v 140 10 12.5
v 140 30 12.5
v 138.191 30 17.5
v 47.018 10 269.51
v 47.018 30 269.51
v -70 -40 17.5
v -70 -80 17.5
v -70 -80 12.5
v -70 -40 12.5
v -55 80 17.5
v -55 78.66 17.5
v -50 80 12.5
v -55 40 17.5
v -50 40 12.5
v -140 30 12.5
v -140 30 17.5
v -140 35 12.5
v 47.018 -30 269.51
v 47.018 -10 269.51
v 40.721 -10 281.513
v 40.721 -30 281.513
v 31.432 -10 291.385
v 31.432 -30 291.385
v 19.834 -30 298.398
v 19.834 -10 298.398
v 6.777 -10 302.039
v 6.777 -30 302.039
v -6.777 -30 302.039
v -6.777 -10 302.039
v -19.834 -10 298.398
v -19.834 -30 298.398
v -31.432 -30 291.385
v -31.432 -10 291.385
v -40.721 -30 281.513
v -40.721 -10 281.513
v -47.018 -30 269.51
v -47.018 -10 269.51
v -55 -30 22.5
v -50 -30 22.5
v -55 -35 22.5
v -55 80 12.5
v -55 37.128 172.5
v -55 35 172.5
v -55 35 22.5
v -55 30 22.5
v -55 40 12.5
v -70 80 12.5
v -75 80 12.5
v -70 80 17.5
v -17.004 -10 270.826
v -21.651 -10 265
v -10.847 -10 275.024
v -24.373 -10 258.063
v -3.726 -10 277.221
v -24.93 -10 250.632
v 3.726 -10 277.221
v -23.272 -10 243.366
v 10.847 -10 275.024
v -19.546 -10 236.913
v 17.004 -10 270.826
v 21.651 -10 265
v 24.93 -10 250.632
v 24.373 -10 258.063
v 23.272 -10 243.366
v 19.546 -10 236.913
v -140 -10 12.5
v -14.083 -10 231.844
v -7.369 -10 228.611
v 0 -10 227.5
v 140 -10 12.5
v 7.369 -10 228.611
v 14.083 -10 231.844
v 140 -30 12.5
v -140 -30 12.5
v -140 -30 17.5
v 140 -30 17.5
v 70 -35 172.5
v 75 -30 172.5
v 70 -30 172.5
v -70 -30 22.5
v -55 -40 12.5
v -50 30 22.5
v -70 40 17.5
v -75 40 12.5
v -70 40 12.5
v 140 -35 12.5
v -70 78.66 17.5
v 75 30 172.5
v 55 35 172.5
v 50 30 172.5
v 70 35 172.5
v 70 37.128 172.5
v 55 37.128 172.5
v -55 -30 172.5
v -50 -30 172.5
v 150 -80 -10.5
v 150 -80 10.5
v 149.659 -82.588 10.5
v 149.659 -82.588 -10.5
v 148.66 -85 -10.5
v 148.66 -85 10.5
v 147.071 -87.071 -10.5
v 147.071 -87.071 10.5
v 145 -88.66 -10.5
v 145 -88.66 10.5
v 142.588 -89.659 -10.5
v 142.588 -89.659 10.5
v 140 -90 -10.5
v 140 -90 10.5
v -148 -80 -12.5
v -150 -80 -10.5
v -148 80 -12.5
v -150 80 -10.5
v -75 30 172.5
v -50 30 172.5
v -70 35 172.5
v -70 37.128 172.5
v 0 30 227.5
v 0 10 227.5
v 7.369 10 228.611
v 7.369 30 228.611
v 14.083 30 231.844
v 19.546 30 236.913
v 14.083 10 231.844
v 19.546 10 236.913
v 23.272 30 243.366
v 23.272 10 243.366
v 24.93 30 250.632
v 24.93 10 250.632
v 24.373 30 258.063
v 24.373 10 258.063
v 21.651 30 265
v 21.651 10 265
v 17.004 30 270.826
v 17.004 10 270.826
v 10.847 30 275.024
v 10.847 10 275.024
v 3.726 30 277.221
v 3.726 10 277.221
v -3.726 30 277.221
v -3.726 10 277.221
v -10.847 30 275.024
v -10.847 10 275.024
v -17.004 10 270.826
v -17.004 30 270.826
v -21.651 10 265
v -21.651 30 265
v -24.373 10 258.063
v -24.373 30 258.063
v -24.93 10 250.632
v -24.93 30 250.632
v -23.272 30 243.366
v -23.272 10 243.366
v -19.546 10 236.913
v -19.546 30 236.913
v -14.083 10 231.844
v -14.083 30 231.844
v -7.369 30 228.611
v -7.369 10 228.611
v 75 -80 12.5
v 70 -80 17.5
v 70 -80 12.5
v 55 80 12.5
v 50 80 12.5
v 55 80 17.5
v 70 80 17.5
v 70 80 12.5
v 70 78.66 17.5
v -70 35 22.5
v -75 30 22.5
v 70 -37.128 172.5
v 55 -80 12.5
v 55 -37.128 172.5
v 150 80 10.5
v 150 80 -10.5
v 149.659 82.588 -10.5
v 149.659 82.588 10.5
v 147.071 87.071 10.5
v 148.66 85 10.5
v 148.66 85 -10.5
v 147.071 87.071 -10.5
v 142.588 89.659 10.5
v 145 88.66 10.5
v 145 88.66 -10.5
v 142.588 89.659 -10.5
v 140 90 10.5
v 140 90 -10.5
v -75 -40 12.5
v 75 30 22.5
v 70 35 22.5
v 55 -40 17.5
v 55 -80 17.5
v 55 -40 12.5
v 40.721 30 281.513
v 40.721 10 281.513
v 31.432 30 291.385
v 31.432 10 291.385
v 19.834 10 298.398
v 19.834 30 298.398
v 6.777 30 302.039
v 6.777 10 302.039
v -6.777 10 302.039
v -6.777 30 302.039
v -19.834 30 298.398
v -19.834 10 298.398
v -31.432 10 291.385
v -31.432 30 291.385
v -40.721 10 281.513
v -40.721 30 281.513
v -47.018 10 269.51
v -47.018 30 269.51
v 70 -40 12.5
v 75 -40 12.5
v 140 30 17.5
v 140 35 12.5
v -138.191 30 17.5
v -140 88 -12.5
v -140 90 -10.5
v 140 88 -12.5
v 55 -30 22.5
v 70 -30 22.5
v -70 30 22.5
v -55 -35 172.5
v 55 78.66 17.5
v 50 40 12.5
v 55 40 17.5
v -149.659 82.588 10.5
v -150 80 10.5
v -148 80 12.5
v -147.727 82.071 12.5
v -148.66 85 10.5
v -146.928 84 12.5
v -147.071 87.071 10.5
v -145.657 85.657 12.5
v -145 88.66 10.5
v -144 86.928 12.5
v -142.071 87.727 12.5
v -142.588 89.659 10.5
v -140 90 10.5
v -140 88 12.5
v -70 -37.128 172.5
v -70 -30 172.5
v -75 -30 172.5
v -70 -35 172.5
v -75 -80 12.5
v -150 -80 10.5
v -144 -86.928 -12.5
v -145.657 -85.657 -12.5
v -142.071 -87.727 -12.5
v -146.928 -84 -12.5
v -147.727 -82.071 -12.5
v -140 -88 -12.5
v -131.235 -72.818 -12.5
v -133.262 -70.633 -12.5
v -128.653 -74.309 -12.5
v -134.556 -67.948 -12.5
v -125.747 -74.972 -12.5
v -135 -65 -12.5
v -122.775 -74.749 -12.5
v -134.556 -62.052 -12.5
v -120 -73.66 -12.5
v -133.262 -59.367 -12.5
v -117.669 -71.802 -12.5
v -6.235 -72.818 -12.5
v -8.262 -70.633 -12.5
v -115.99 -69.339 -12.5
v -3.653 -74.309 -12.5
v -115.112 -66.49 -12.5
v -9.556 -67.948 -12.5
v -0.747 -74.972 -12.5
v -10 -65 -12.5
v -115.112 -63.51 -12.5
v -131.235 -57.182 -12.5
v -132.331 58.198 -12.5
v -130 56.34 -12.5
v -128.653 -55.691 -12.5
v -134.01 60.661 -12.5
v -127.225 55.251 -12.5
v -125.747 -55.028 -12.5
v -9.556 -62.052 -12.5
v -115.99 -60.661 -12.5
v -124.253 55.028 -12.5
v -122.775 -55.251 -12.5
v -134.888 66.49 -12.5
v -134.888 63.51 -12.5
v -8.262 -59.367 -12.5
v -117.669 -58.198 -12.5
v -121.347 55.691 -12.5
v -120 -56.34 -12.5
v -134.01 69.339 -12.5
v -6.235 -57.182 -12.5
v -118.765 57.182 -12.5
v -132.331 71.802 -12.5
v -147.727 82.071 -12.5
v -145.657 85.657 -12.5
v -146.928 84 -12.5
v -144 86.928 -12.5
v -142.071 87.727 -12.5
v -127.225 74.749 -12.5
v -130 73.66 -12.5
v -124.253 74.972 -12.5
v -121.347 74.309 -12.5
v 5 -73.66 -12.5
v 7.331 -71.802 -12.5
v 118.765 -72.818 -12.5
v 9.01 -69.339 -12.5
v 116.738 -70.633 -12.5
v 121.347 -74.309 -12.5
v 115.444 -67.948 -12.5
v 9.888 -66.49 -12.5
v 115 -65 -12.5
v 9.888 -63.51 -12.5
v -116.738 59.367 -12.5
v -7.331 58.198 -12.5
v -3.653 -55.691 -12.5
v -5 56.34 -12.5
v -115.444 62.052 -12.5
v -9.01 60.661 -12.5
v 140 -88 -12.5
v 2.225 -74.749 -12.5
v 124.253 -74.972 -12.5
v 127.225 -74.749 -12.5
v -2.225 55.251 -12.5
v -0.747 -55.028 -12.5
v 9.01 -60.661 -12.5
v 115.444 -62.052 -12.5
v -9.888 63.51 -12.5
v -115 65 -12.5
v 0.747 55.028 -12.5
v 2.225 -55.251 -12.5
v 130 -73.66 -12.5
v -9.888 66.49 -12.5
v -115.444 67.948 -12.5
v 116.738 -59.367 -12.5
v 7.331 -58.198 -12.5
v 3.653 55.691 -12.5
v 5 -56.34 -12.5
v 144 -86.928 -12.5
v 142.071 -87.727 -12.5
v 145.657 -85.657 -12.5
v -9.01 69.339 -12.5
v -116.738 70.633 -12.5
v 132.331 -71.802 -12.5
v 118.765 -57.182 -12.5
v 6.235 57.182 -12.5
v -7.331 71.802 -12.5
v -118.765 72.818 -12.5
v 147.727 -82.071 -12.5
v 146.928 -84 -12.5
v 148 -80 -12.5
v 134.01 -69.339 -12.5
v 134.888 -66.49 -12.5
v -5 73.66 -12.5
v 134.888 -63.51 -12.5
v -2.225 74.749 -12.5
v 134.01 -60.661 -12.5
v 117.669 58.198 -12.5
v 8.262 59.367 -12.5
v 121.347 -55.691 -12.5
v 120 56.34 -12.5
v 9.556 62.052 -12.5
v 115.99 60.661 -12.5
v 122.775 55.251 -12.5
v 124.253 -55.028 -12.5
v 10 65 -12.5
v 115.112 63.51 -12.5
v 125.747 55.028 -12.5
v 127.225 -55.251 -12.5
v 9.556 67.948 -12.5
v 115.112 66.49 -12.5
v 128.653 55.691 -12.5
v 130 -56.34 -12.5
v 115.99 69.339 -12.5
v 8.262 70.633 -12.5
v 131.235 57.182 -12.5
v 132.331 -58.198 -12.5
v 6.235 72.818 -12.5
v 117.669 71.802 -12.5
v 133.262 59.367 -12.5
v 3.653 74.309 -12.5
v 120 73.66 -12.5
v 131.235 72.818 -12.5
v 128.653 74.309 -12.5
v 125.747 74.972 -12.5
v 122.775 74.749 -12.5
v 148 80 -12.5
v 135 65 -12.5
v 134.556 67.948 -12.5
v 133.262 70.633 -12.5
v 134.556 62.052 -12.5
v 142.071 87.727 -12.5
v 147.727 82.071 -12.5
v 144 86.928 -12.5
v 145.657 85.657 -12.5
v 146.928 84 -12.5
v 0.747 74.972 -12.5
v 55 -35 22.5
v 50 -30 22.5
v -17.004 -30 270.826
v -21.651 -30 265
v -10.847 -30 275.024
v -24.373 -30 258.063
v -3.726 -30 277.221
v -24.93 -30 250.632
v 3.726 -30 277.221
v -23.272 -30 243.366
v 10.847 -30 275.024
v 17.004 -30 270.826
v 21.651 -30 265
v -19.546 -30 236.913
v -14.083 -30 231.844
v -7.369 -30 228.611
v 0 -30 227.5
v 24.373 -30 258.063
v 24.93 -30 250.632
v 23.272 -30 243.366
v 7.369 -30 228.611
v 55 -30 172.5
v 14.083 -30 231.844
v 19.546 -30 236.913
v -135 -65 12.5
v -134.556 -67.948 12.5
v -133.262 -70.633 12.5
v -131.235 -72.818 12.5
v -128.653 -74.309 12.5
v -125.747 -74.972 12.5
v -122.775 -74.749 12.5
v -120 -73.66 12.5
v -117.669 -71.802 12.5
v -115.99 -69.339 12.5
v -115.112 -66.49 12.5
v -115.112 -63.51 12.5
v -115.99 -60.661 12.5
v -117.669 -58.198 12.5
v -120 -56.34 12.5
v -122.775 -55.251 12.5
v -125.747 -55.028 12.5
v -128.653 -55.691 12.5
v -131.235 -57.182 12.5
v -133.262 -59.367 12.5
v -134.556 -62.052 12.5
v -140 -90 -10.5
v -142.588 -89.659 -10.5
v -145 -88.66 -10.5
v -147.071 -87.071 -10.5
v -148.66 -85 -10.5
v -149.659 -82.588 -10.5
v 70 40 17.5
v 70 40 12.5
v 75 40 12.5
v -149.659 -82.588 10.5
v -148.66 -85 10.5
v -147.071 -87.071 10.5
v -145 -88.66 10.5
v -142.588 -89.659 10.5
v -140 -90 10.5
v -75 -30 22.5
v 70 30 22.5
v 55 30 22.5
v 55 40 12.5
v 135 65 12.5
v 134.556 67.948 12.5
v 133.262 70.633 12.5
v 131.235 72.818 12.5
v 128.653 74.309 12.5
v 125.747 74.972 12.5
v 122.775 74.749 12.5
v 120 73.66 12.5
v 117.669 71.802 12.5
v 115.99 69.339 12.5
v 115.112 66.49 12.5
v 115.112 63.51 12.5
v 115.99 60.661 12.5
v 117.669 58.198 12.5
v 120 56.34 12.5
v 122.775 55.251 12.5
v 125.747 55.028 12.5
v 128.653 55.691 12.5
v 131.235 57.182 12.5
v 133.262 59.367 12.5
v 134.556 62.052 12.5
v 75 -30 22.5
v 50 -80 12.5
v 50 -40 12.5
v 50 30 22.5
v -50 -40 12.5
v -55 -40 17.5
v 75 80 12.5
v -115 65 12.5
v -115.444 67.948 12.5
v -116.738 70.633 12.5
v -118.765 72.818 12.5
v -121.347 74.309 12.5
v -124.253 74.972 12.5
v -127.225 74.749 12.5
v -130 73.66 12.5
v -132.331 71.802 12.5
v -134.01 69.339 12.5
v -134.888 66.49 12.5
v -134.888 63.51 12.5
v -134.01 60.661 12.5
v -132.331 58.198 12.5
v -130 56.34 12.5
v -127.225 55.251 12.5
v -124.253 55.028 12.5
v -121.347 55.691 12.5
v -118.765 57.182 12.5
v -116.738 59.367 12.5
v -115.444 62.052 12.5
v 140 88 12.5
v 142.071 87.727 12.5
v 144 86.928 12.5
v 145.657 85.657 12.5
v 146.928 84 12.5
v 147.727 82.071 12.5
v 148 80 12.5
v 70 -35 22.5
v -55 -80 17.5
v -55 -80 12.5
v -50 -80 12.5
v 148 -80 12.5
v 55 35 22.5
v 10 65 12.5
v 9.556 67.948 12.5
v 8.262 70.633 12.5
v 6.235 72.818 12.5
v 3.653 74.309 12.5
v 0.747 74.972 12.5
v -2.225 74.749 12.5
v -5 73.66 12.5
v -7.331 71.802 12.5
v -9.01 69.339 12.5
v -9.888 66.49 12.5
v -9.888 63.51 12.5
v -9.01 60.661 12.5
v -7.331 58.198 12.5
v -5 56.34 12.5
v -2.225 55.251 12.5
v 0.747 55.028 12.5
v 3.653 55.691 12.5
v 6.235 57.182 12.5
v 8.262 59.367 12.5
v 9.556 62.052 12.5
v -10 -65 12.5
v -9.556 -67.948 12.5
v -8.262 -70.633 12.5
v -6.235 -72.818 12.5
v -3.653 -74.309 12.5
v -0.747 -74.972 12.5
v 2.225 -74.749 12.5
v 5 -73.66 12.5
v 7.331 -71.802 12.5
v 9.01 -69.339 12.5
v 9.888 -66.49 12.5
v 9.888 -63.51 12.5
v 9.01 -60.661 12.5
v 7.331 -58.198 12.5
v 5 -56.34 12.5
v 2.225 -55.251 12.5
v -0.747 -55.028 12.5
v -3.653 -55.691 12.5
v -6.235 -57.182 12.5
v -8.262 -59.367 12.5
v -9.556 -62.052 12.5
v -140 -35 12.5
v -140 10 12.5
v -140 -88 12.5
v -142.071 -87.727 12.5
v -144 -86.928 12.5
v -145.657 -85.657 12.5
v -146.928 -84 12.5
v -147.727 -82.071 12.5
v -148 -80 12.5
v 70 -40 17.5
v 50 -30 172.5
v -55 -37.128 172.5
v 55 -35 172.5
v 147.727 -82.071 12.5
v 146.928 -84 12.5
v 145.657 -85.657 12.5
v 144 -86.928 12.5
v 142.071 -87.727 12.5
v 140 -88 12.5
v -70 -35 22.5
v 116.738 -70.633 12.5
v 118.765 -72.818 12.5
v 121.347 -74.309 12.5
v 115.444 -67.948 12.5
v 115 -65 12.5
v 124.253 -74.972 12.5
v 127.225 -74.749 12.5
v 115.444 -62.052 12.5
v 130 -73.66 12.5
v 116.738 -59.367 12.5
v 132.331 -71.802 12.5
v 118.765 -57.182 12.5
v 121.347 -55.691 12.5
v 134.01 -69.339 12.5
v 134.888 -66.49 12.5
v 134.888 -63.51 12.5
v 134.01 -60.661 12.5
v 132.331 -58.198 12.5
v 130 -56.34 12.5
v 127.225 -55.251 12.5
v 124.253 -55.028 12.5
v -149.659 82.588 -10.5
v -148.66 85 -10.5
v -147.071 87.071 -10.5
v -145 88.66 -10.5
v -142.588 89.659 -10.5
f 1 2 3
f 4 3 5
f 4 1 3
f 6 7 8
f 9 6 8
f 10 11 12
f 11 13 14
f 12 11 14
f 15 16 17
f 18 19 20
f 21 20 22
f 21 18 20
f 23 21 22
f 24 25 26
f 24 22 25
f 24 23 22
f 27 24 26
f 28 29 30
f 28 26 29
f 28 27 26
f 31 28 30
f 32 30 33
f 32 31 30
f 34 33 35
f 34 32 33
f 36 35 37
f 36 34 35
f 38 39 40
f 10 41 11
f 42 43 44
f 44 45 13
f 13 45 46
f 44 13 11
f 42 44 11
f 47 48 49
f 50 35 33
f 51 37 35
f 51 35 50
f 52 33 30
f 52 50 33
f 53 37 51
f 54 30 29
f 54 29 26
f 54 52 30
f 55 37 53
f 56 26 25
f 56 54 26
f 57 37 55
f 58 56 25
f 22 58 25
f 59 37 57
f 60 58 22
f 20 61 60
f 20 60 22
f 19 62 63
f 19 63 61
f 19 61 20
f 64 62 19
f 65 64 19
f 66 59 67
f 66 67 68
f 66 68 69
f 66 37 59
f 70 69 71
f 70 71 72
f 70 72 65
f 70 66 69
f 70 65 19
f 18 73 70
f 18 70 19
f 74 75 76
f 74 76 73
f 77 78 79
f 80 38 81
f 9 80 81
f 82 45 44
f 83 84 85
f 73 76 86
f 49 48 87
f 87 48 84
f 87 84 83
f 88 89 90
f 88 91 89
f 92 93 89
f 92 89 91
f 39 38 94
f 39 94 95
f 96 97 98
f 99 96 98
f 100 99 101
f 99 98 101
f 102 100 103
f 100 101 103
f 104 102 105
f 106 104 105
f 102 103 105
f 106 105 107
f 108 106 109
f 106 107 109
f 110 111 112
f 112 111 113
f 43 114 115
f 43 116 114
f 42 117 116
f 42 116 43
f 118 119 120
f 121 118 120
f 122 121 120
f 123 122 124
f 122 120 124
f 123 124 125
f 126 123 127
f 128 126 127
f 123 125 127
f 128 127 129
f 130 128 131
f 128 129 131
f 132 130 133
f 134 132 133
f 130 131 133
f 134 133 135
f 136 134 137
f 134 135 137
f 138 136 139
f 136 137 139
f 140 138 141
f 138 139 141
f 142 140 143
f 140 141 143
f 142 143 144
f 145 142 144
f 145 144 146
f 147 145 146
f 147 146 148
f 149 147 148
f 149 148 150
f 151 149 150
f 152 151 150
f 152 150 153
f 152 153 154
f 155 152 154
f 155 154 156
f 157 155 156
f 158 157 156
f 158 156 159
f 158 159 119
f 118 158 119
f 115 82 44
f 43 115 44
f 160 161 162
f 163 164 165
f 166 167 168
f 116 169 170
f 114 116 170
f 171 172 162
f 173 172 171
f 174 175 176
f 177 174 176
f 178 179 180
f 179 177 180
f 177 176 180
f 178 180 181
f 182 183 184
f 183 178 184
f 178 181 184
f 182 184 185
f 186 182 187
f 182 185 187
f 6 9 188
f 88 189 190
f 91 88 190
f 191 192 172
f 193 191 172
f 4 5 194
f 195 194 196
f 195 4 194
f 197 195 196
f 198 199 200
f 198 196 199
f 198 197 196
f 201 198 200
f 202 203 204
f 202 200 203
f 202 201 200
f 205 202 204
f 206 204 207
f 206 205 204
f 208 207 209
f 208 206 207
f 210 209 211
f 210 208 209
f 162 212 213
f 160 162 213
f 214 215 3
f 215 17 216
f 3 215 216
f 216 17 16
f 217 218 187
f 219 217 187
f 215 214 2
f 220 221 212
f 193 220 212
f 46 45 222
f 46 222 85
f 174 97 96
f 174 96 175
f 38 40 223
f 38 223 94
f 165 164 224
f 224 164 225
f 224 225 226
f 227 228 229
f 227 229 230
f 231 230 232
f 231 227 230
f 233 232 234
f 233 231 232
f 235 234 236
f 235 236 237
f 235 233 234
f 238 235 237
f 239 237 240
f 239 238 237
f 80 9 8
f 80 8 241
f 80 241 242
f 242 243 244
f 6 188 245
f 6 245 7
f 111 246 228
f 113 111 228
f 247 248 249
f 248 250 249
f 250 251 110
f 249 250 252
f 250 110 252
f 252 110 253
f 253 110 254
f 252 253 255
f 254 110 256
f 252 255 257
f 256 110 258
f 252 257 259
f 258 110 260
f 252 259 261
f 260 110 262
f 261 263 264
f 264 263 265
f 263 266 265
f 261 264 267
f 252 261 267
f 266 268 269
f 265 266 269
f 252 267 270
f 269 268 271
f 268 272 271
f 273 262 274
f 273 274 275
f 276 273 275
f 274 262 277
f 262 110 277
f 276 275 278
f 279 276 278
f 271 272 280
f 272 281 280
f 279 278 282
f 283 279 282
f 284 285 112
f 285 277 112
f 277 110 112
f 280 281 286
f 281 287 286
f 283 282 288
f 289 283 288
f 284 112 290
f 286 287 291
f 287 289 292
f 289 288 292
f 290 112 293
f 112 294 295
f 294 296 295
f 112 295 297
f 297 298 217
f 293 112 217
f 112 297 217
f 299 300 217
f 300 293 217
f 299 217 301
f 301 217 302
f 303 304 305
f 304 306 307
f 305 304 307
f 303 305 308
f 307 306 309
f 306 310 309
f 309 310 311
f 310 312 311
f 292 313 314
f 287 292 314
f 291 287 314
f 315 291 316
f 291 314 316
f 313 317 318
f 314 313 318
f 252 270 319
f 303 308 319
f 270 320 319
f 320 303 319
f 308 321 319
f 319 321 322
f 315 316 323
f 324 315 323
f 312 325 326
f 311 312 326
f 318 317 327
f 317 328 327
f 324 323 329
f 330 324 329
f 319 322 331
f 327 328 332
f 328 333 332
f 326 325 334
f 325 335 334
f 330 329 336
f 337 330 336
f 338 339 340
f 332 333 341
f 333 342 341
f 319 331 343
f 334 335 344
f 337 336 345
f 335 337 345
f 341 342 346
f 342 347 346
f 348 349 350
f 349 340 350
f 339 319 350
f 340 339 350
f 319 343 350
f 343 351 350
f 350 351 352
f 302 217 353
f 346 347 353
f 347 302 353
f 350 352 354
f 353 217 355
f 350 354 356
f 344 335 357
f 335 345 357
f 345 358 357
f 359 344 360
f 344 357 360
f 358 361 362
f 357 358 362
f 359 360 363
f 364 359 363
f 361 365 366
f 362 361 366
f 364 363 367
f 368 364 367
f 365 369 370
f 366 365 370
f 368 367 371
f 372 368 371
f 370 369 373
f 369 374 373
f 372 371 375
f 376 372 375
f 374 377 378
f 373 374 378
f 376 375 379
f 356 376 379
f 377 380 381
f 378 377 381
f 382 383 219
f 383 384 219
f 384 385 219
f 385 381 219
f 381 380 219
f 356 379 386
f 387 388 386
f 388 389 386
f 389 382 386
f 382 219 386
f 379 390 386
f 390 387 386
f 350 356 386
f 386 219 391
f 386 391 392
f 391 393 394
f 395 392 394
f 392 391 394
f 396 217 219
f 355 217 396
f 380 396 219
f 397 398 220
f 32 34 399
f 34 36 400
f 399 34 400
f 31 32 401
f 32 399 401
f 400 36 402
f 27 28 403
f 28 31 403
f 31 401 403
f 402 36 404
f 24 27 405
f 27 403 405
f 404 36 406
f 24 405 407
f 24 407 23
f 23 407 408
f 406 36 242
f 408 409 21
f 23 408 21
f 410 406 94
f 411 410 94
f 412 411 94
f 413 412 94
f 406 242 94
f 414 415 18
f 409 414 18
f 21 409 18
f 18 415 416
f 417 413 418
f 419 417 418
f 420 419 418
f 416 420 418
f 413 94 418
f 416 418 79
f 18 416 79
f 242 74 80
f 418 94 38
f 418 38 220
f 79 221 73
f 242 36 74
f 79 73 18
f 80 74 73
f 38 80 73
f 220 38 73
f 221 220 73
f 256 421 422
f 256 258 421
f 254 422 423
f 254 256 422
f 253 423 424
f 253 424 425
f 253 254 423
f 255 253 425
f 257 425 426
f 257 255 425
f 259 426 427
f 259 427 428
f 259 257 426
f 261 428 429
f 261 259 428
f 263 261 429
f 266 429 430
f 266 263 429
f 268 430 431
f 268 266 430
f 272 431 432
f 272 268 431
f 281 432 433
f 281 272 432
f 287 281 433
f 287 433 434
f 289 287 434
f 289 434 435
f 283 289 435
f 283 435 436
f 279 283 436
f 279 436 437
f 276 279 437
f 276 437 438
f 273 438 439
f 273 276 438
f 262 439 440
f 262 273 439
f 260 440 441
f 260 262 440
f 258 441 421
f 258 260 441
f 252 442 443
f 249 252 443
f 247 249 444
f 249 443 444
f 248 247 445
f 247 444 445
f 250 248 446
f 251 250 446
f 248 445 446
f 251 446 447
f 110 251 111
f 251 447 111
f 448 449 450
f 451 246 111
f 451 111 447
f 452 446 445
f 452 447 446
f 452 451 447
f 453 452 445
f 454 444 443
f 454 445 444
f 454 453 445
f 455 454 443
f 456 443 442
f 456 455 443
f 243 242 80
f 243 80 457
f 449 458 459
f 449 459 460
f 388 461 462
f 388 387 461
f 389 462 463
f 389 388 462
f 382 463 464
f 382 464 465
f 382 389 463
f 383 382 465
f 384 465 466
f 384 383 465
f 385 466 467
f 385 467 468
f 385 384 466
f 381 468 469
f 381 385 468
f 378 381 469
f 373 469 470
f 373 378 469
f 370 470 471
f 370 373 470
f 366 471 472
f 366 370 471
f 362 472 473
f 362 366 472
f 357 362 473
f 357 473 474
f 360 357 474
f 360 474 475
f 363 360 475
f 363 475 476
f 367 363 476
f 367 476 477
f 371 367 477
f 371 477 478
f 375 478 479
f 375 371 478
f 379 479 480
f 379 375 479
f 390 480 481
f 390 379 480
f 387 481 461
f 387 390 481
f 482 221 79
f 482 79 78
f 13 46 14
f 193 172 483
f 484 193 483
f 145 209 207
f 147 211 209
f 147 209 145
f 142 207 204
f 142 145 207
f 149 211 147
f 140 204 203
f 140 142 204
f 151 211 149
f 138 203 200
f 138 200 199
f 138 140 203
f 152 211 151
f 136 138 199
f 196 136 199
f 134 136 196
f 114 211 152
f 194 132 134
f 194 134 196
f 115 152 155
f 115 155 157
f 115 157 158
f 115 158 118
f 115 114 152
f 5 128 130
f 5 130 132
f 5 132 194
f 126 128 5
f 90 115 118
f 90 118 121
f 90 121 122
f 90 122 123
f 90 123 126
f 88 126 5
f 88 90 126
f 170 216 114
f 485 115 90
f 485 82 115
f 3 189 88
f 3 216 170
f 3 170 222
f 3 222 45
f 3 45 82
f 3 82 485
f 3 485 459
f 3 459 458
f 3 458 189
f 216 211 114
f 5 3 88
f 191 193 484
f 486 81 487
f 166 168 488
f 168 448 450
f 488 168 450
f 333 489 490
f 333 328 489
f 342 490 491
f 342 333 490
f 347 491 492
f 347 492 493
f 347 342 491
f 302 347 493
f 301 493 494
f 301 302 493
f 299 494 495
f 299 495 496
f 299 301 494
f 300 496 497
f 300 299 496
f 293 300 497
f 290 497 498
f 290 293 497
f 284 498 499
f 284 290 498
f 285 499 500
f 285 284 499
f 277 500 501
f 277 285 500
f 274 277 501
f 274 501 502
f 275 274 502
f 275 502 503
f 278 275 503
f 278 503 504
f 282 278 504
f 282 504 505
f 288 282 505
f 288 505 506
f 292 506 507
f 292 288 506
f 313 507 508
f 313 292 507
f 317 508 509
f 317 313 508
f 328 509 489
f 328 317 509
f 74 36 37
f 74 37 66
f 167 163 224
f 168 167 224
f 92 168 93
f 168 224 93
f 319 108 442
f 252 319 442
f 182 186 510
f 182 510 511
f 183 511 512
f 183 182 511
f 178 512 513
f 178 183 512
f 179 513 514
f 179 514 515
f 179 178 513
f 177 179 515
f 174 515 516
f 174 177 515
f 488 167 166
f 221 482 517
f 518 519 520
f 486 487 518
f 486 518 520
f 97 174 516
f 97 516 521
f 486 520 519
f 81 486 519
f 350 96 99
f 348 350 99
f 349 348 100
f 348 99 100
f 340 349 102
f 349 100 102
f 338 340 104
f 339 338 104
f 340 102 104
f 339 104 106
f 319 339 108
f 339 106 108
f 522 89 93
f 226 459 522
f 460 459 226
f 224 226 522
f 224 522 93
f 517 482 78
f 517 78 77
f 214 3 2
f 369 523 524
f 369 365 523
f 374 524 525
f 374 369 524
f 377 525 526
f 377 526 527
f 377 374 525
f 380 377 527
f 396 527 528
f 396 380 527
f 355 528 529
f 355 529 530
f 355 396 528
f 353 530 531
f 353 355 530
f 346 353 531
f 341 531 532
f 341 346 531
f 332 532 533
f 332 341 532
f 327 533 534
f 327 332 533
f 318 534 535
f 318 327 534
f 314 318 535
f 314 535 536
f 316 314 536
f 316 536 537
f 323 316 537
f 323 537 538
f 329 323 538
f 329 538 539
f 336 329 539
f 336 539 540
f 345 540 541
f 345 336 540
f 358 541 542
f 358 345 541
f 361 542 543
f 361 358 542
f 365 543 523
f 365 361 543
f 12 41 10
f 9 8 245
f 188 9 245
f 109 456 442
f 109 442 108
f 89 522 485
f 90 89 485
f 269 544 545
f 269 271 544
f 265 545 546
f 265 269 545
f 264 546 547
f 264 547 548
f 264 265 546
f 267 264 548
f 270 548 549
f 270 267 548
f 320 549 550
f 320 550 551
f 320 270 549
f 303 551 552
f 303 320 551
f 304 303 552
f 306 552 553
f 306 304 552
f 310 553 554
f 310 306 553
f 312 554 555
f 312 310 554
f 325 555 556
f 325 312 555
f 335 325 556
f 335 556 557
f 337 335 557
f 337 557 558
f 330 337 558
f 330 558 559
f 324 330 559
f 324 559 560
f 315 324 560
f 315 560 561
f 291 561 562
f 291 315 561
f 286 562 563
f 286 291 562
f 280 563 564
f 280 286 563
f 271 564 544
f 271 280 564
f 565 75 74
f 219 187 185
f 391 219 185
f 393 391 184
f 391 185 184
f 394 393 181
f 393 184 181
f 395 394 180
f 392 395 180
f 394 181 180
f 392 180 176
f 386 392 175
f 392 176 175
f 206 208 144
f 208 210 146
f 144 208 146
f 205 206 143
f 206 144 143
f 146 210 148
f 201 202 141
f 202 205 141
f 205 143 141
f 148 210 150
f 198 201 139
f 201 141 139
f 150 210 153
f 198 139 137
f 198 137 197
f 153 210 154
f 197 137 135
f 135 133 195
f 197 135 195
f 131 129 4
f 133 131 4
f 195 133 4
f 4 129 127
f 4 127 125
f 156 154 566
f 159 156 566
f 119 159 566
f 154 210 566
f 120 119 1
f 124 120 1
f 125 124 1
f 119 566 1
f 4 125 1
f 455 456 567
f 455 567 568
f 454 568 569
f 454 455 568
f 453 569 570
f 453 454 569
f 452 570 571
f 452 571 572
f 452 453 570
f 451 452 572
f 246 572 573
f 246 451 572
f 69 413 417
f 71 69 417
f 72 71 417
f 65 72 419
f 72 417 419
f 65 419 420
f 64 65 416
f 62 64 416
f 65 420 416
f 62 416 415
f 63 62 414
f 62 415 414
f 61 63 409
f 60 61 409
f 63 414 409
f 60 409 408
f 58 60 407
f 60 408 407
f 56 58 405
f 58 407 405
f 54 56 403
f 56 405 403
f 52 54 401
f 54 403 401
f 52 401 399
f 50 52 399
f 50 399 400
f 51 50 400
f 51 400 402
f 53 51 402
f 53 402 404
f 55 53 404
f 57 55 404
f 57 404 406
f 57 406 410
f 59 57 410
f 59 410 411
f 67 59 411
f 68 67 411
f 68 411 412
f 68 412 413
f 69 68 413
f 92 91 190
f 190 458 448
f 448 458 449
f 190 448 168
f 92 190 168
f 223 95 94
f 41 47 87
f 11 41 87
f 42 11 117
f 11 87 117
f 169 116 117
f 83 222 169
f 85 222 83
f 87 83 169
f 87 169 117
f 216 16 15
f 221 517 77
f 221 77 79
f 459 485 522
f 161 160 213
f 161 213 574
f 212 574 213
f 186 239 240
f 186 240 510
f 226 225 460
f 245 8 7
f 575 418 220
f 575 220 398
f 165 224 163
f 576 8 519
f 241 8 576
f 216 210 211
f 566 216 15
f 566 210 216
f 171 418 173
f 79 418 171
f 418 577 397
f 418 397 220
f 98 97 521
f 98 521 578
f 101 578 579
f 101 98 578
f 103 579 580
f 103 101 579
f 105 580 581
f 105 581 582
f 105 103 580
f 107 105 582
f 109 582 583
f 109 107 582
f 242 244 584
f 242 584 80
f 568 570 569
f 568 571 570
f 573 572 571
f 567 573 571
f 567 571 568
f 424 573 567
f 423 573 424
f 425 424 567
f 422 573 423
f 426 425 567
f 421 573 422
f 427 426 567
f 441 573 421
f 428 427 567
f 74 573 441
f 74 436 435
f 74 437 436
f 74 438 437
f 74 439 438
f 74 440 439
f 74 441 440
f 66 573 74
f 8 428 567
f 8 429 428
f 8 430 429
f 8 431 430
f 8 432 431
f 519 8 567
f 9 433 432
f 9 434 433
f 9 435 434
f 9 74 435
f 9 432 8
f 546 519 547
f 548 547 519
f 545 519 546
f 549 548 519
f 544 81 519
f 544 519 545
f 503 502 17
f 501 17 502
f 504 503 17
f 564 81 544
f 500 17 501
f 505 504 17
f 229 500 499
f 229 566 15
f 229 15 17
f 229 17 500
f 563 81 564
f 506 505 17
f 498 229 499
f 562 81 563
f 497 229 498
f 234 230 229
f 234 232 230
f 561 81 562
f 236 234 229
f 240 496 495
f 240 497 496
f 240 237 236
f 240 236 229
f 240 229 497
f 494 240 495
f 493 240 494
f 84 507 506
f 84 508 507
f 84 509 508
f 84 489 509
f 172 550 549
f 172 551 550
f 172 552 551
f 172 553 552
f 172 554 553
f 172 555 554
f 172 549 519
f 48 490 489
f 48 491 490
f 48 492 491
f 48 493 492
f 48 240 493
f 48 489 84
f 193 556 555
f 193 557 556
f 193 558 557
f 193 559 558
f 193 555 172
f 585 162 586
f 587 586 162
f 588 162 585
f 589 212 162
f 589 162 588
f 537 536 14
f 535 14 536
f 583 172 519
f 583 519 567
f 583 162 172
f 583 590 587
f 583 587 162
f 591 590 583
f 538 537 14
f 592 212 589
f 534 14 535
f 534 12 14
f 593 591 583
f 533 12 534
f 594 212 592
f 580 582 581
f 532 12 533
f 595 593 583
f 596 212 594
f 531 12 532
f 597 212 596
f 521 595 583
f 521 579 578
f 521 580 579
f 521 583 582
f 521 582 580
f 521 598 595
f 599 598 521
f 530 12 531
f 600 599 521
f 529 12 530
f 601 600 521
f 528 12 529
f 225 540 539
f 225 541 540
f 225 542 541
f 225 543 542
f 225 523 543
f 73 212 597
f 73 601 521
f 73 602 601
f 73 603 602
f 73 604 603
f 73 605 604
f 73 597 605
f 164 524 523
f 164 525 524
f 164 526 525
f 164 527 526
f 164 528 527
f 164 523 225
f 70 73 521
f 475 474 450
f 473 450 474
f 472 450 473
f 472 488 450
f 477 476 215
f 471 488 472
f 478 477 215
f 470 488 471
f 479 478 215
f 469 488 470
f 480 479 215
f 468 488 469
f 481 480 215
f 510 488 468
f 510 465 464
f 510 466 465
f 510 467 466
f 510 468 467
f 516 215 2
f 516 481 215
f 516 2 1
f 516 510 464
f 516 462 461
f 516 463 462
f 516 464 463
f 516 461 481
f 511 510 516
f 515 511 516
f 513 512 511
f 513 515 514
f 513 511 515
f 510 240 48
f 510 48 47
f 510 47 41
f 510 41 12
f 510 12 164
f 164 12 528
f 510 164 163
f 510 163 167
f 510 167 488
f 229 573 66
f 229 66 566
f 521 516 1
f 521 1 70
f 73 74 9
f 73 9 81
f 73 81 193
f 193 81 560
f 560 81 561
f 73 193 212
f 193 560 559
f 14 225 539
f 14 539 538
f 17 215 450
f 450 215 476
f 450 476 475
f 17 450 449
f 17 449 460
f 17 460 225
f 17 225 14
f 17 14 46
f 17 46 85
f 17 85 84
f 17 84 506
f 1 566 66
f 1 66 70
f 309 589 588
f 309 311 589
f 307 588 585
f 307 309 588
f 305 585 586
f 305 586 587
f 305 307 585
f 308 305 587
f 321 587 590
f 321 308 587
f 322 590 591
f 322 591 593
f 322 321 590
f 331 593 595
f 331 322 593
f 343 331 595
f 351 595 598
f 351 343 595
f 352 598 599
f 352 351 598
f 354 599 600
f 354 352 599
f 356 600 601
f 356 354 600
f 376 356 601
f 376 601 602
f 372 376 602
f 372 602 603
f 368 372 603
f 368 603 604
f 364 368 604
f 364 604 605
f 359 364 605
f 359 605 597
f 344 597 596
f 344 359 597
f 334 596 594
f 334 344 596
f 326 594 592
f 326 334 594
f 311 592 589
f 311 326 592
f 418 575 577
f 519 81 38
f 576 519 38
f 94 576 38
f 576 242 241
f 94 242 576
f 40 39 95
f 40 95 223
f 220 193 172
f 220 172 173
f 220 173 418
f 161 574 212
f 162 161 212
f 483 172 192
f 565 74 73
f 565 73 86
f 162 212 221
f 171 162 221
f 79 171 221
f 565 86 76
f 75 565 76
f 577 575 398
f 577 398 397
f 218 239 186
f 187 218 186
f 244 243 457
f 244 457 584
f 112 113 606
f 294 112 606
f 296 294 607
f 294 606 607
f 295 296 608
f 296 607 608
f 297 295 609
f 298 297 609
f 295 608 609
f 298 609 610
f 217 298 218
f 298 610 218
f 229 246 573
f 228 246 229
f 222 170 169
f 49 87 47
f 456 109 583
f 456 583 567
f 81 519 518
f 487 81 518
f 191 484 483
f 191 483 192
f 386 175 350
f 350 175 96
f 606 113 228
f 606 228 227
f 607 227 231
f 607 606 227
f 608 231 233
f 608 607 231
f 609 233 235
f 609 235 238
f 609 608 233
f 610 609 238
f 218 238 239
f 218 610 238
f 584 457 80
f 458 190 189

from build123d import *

# Parameters (mm, degrees)
SKETCH1_W           = 300
SKETCH1_H           = 180
SKETCH1_R           = 10
BOSS_EXTRUDE1_DEPTH = 12.5
FILLET1_R           = 10
CHAMFER1_SIZE       = 2
SKETCH6_W           = 280
SKETCH6_H           = 20
BOSS_EXTRUDE3_DEPTH = 290
SKETCH7_R           = 25
CUT_EXTRUDE2_DEPTH  = 359.338178262
SKETCH8_W           = 15
SKETCH8_H           = 50
BOSS_EXTRUDE4_DEPTH = 160
CUT_EXTRUDE3_DEPTH  = 385.715804198
GUSSET1_THICKNESS   = 280
GUSSET2_THICKNESS   = 150
GUSSET3_THICKNESS   = 150
GUSSET4_THICKNESS   = 150
GUSSET5_THICKNESS   = 150
GUSSET6_THICKNESS   = 40
GUSSET7_THICKNESS   = 40
GUSSET8_THICKNESS   = 40
GUSSET9_THICKNESS   = 40
MIRROR1_START       = 22.5
MIRROR1_DEPTH       = 150
MIRROR1_START_2     = -140
MIRROR1_2_DEPTH     = 280
MIRROR1_3_DEPTH     = 150
MIRROR1_START_3     = 40
MIRROR1_4_DEPTH     = 40


with BuildPart() as part:
    # Sketch1 → Boss-Extrude1 (new, symmetric)
    with BuildSketch(Plane.XY):
        Rectangle(SKETCH1_W, SKETCH1_H)
        with Locations((-125, 65)):
            Circle(SKETCH1_R, mode=Mode.SUBTRACT)
        with Locations((0, 65)):
            Circle(SKETCH1_R, mode=Mode.SUBTRACT)
        with Locations((125, 65)):
            Circle(SKETCH1_R, mode=Mode.SUBTRACT)
        with Locations(Location((125, -65, 0), (0, 0, 180))):
            Circle(SKETCH1_R, mode=Mode.SUBTRACT)
        with Locations(Location((0, -65, 0), (0, 0, 180))):
            Circle(SKETCH1_R, mode=Mode.SUBTRACT)
        with Locations(Location((-125, -65, 0), (0, 0, 180))):
            Circle(SKETCH1_R, mode=Mode.SUBTRACT)
    extrude(amount=BOSS_EXTRUDE1_DEPTH, both=True)

    # Fillet1
    fillet1_edges = [part.edges().sort_by_distance(p)[0] for p in [
        (150, -90, 0),
        (-150, -90, 0),
        (-150, 90, 0),
        (150, 90, 0),
    ]]
    fillet(fillet1_edges, radius=FILLET1_R)

    # Chamfer1
    chamfer1_edges = [part.edges().sort_by_distance(p)[0] for p in [
        (0, 90, -12.5),
        (0, 90, 12.5),
        (150, 0, -12.5),
        (0, -90, -12.5),
        (-150, 0, -12.5),
        (-147.071067812, 87.071067812, -12.5),
        (-147.071067812, -87.071067812, -12.5),
        (147.071067812, -87.071067812, -12.5),
        (147.071067812, 87.071067812, -12.5),
        (150, 0, 12.5),
        (-150, 0, 12.5),
        (0, -90, 12.5),
        (-147.071067812, 87.071067812, 12.5),
        (-147.071067812, -87.071067812, 12.5),
        (147.071067812, -87.071067812, 12.5),
        (147.071067812, 87.071067812, 12.5),
    ]]
    chamfer(chamfer1_edges, length=CHAMFER1_SIZE)

    # Sketch6 → Boss-Extrude3 (add)
    with BuildSketch(Plane.XY.offset(12.5)):
        with Locations((0, -20)):
            Rectangle(SKETCH6_W, SKETCH6_H)
        with Locations((0, 20)):
            Rectangle(SKETCH6_W, SKETCH6_H)
    extrude(amount=BOSS_EXTRUDE3_DEPTH)

    # Sketch7 → Cut-Extrude2 (cut, through all)
    with BuildSketch(Plane.XZ.offset(30)):
        with Locations(Location((0, 252.5, 0), (0, 0, 270))):
            Circle(SKETCH7_R)
        with BuildLine():
            Line((-47.017565913, 269.510246783), (-140, 12.5))
            Line((-140, 12.5), (-140, 338.026401393))
            Line((-140, 338.026401393), (140, 338.026401393))
            Line((140, 338.026401393), (140, 12.5))
            Line((140, 12.5), (47.017565913, 269.510246783))
            ThreePointArc((47.017565913, 269.510246783), (0, 302.5), (-47.017565913, 269.510246783))
        make_face()
    extrude(amount=-CUT_EXTRUDE2_DEPTH, mode=Mode.SUBTRACT)

    # Sketch8 → Boss-Extrude4 (add)
    with BuildSketch(Plane.XY.offset(12.5)):
        with Locations((62.5, -55)):
            Rectangle(SKETCH8_W, SKETCH8_H)
        with Locations((-62.5, -55)):
            Rectangle(SKETCH8_W, SKETCH8_H)
        with Locations((62.5, 55)):
            Rectangle(SKETCH8_W, SKETCH8_H)
        with Locations((-62.5, 55)):
            Rectangle(SKETCH8_W, SKETCH8_H)
    extrude(amount=BOSS_EXTRUDE4_DEPTH)

    # Sketch9 → Cut-Extrude3 (cut, through all)
    with BuildSketch(Plane.ZY.offset(70)):
        Polygon((12.5, 80), (172.5, 37.128129211), (172.5, 80), align=None)
        Polygon((22.5, 30), (12.5, 40), (12.5, 30), align=None)
        Polygon((12.5, -40), (12.5, -30), (22.5, -30), align=None)
        Polygon((172.5, -37.128129211), (176.037028875, -86.220399065), (12.5, -80), align=None)
    extrude(amount=-CUT_EXTRUDE3_DEPTH, mode=Mode.SUBTRACT)

    # Mirror1: read off the stored shape, not the designer's step
    # Mirror1 outline → Mirror1 (add)
    with BuildSketch(Plane.XY.offset(MIRROR1_START)):
        Polygon((70, 35), (70, 30), (75, 30), align=None)
        Polygon((-75, 30), (-70, 30), (-70, 35), align=None)
        Polygon((-50, 30), (-55, 35), (-55, 30), align=None)
    extrude(amount=MIRROR1_DEPTH)

    # Mirror1 2 outline → Mirror1 2 (add)
    with BuildSketch(Plane.YZ.offset(MIRROR1_START_2)):
        Polygon((30, 17.5), (30, 12.5), (35, 12.5), align=None)
    extrude(amount=MIRROR1_2_DEPTH)

    # Mirror1 3 outline → Mirror1 3 (add)
    with BuildSketch(Plane.XY.offset(MIRROR1_START)):
        Polygon((55, 35), (50, 30), (55, 30), align=None)
    extrude(amount=MIRROR1_3_DEPTH)

    # Mirror1 4 outline → Mirror1 4 (add)
    with BuildSketch(Plane(origin=(0, 0, 0), x_dir=(1, 0, 0), z_dir=(0, 1, 0)).offset(MIRROR1_START_3)):
        Polygon((-70, -17.5), (-70, -12.5), (-75, -12.5), align=None)
        Polygon((75, -12.5), (70, -12.5), (70, -17.5), align=None)
        Polygon((55, -12.5), (50, -12.5), (55, -17.5), align=None)
        Polygon((-55, -17.5), (-50, -12.5), (-55, -12.5), align=None)
    extrude(amount=MIRROR1_4_DEPTH)


with BuildPart() as body_2:
    # Gusset1: a gusset: a plate 280.0 thick in the corner of two members, its outline drawn in place
    gusset1_outline = Wire([Line((-140, -30, 12.5), (-140, -35, 12.5)), Line((-140, -35, 12.5), (-140, -30, 17.5)), Line((-140, -30, 17.5), (-140, -30, 12.5))])
    add(extrude(Face(gusset1_outline), amount=GUSSET1_THICKNESS, dir=(1, 0, 0)))


with BuildPart() as body_3:
    # Gusset2: a gusset: a plate 150.0 thick in the corner of two members, its outline drawn in place
    gusset2_outline = Wire([Line((-55, -30, 22.5), (-50, -30, 22.5)), Line((-50, -30, 22.5), (-55, -35, 22.5)), Line((-55, -35, 22.5), (-55, -30, 22.5))])
    add(extrude(Face(gusset2_outline), amount=GUSSET2_THICKNESS, dir=(0, 0, 1)))


with BuildPart() as body_4:
    # Gusset3: a gusset: a plate 150.0 thick in the corner of two members, its outline drawn in place
    gusset3_outline = Wire([Line((55, -30, 172.5), (50, -30, 172.5)), Line((50, -30, 172.5), (55, -35, 172.5)), Line((55, -35, 172.5), (55, -30, 172.5))])
    add(extrude(Face(gusset3_outline), amount=GUSSET3_THICKNESS, dir=(0, 0, -1)))


with BuildPart() as body_5:
    # Gusset4: a gusset: a plate 150.0 thick in the corner of two members, its outline drawn in place
    gusset4_outline = Wire([Line((70, -30, 22.5), (75, -30, 22.5)), Line((75, -30, 22.5), (70, -35, 22.5)), Line((70, -35, 22.5), (70, -30, 22.5))])
    add(extrude(Face(gusset4_outline), amount=GUSSET4_THICKNESS, dir=(0, 0, 1)))


with BuildPart() as body_6:
    # Gusset5: a gusset: a plate 150.0 thick in the corner of two members, its outline drawn in place
    gusset5_outline = Wire([Line((-70, -30, 172.5), (-75, -30, 172.5)), Line((-75, -30, 172.5), (-70, -35, 172.5)), Line((-70, -35, 172.5), (-70, -30, 172.5))])
    add(extrude(Face(gusset5_outline), amount=GUSSET5_THICKNESS, dir=(0, 0, -1)))


with BuildPart() as body_7:
    # Gusset6: a gusset: a plate 40.0 thick in the corner of two members, its outline drawn in place
    gusset6_outline = Wire([Line((-55, -40, 12.5), (-55, -40, 17.5)), Line((-55, -40, 17.5), (-50, -40, 12.5)), Line((-50, -40, 12.5), (-55, -40, 12.5))])
    add(extrude(Face(gusset6_outline), amount=GUSSET6_THICKNESS, dir=(0, -1, 0)))


with BuildPart() as body_8:
    # Gusset7: a gusset: a plate 40.0 thick in the corner of two members, its outline drawn in place
    gusset7_outline = Wire([Line((-70, -40, 12.5), (-75, -40, 12.5)), Line((-75, -40, 12.5), (-70, -40, 17.5)), Line((-70, -40, 17.5), (-70, -40, 12.5))])
    add(extrude(Face(gusset7_outline), amount=GUSSET7_THICKNESS, dir=(0, -1, 0)))


with BuildPart() as body_9:
    # Gusset8: a gusset: a plate 40.0 thick in the corner of two members, its outline drawn in place
    gusset8_outline = Wire([Line((70, -80, 12.5), (75, -80, 12.5)), Line((75, -80, 12.5), (70, -80, 17.5)), Line((70, -80, 17.5), (70, -80, 12.5))])
    add(extrude(Face(gusset8_outline), amount=GUSSET8_THICKNESS, dir=(0, 1, 0)))


with BuildPart() as body_10:
    # Gusset9: a gusset: a plate 40.0 thick in the corner of two members, its outline drawn in place
    gusset9_outline = Wire([Line((55, -40, 12.5), (50, -40, 12.5)), Line((50, -40, 12.5), (55, -40, 17.5)), Line((55, -40, 17.5), (55, -40, 12.5))])
    add(extrude(Face(gusset9_outline), amount=GUSSET9_THICKNESS, dir=(0, -1, 0)))


solid = Compound([part.part, body_2.part, body_3.part, body_4.part, body_5.part, body_6.part, body_7.part, body_8.part, body_9.part, body_10.part])
